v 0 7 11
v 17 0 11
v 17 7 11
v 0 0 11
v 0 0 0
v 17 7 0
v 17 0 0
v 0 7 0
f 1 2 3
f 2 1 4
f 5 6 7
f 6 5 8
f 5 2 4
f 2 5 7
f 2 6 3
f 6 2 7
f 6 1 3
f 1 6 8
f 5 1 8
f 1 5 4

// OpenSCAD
// Generated by SolidPython 1.0.1 on 2020-07-29 00:46:56


cube(size = [17, 7, 11]);
/***********************************************
*********      SolidPython code:      **********
************************************************
 
# import packages: SolidPython
from solid import *
from solid.utils import *
from itertools import chain, combinations, permutations


class Resize:

    def __init__(self, scad_file):
        self.scad_file = scad_file
        #self.scad_file = import_scad(scad_file)
        # cone/cylinder param:
        self.r1 = 0
        self.r2 = 0
        self.h = 0
        # rectangular prism param:
        self.w = 0
        self.l = 0
        # ellipse param:
        self.r = 0

    # import OpenScad code (file name corresponds to shape)


    # classify shape + parameters
    def assign(self, param1, param2, param3):
        if self.scad_file == 'cone.scad':
            self.r1 = param1
            self.r2 = param2
            self.h = param3
        elif self.scad_file == 'cylinder.scad':
            self.r1 = param1
            self.r2 = param2
            self.h = param3
        elif self.scad_file == 'rectangularPrism.scad':
            self.h = param1
            self.l = param2
            self.w = param3
        else:
            self.r = param1
            self.h = param2

    # resize parameters
    def iterate(self):
        x = range(3, 20, 2)
        i = 1
        if self.scad_file == 'cone.scad':
            tempList = list(permutations(x, 2))
            for temp in tempList:
                param1 = temp[0]
                param2 = temp[1]
                filepath = 'produced_scad_files/' + 'cone' + str(param1) + '_' + str(param2) + '_' + '.scad'
                scad_render_to_file(cylinder(h=param1, r1=param2, r2=0), filepath)

        elif self.scad_file == 'cylinder.scad':
            tempList = list(permutations(x, 3))
            for temp in tempList:
                param1 = temp[0]
                param2 = temp[1]
                filepath = 'produced_scad_files/' + 'cylinder' + str(param1) + '_' + str(param2) + '_' + '.scad'
                scad_render_to_file(cylinder(h=param1, r1=param2, r2=param2), filepath)

        elif self.scad_file == 'rectangularPrism.scad':
            tempList = list(permutations(x, 3))
            for temp in tempList:
                param1 = temp[0]
                param2 = temp[1]
                param3 = temp[2]
                filepath = 'produced_scad_files/' + 'rectangularPrism' + str(param1) + '_' + str(param2) + '_' + str(
                    param3) + '.scad'
                scad_render_to_file(cube(size=(param1, param2, param3)), filepath)

        elif self.scad_file == 'ellipse.scad':
            tempList = list(permutations(x, 4))
            for temp in tempList:
                param1 = temp[0]
                param2 = temp[1]
                param3 = temp[2]
                param4 = temp[3]
                filepath = 'produced_scad_files/' + 'ellipse' + str(param1) + '_' + str(param2) + '_' + str(param3) + '_' + str(param4) + '.scad'
                scad_render_to_file(scale([param1, param2, param3])(sphere(r=param4)), filepath)

    def render_to_scadfile(self):
        scad_render_to_file(scad, 'example.scad') 
 
************************************************/
